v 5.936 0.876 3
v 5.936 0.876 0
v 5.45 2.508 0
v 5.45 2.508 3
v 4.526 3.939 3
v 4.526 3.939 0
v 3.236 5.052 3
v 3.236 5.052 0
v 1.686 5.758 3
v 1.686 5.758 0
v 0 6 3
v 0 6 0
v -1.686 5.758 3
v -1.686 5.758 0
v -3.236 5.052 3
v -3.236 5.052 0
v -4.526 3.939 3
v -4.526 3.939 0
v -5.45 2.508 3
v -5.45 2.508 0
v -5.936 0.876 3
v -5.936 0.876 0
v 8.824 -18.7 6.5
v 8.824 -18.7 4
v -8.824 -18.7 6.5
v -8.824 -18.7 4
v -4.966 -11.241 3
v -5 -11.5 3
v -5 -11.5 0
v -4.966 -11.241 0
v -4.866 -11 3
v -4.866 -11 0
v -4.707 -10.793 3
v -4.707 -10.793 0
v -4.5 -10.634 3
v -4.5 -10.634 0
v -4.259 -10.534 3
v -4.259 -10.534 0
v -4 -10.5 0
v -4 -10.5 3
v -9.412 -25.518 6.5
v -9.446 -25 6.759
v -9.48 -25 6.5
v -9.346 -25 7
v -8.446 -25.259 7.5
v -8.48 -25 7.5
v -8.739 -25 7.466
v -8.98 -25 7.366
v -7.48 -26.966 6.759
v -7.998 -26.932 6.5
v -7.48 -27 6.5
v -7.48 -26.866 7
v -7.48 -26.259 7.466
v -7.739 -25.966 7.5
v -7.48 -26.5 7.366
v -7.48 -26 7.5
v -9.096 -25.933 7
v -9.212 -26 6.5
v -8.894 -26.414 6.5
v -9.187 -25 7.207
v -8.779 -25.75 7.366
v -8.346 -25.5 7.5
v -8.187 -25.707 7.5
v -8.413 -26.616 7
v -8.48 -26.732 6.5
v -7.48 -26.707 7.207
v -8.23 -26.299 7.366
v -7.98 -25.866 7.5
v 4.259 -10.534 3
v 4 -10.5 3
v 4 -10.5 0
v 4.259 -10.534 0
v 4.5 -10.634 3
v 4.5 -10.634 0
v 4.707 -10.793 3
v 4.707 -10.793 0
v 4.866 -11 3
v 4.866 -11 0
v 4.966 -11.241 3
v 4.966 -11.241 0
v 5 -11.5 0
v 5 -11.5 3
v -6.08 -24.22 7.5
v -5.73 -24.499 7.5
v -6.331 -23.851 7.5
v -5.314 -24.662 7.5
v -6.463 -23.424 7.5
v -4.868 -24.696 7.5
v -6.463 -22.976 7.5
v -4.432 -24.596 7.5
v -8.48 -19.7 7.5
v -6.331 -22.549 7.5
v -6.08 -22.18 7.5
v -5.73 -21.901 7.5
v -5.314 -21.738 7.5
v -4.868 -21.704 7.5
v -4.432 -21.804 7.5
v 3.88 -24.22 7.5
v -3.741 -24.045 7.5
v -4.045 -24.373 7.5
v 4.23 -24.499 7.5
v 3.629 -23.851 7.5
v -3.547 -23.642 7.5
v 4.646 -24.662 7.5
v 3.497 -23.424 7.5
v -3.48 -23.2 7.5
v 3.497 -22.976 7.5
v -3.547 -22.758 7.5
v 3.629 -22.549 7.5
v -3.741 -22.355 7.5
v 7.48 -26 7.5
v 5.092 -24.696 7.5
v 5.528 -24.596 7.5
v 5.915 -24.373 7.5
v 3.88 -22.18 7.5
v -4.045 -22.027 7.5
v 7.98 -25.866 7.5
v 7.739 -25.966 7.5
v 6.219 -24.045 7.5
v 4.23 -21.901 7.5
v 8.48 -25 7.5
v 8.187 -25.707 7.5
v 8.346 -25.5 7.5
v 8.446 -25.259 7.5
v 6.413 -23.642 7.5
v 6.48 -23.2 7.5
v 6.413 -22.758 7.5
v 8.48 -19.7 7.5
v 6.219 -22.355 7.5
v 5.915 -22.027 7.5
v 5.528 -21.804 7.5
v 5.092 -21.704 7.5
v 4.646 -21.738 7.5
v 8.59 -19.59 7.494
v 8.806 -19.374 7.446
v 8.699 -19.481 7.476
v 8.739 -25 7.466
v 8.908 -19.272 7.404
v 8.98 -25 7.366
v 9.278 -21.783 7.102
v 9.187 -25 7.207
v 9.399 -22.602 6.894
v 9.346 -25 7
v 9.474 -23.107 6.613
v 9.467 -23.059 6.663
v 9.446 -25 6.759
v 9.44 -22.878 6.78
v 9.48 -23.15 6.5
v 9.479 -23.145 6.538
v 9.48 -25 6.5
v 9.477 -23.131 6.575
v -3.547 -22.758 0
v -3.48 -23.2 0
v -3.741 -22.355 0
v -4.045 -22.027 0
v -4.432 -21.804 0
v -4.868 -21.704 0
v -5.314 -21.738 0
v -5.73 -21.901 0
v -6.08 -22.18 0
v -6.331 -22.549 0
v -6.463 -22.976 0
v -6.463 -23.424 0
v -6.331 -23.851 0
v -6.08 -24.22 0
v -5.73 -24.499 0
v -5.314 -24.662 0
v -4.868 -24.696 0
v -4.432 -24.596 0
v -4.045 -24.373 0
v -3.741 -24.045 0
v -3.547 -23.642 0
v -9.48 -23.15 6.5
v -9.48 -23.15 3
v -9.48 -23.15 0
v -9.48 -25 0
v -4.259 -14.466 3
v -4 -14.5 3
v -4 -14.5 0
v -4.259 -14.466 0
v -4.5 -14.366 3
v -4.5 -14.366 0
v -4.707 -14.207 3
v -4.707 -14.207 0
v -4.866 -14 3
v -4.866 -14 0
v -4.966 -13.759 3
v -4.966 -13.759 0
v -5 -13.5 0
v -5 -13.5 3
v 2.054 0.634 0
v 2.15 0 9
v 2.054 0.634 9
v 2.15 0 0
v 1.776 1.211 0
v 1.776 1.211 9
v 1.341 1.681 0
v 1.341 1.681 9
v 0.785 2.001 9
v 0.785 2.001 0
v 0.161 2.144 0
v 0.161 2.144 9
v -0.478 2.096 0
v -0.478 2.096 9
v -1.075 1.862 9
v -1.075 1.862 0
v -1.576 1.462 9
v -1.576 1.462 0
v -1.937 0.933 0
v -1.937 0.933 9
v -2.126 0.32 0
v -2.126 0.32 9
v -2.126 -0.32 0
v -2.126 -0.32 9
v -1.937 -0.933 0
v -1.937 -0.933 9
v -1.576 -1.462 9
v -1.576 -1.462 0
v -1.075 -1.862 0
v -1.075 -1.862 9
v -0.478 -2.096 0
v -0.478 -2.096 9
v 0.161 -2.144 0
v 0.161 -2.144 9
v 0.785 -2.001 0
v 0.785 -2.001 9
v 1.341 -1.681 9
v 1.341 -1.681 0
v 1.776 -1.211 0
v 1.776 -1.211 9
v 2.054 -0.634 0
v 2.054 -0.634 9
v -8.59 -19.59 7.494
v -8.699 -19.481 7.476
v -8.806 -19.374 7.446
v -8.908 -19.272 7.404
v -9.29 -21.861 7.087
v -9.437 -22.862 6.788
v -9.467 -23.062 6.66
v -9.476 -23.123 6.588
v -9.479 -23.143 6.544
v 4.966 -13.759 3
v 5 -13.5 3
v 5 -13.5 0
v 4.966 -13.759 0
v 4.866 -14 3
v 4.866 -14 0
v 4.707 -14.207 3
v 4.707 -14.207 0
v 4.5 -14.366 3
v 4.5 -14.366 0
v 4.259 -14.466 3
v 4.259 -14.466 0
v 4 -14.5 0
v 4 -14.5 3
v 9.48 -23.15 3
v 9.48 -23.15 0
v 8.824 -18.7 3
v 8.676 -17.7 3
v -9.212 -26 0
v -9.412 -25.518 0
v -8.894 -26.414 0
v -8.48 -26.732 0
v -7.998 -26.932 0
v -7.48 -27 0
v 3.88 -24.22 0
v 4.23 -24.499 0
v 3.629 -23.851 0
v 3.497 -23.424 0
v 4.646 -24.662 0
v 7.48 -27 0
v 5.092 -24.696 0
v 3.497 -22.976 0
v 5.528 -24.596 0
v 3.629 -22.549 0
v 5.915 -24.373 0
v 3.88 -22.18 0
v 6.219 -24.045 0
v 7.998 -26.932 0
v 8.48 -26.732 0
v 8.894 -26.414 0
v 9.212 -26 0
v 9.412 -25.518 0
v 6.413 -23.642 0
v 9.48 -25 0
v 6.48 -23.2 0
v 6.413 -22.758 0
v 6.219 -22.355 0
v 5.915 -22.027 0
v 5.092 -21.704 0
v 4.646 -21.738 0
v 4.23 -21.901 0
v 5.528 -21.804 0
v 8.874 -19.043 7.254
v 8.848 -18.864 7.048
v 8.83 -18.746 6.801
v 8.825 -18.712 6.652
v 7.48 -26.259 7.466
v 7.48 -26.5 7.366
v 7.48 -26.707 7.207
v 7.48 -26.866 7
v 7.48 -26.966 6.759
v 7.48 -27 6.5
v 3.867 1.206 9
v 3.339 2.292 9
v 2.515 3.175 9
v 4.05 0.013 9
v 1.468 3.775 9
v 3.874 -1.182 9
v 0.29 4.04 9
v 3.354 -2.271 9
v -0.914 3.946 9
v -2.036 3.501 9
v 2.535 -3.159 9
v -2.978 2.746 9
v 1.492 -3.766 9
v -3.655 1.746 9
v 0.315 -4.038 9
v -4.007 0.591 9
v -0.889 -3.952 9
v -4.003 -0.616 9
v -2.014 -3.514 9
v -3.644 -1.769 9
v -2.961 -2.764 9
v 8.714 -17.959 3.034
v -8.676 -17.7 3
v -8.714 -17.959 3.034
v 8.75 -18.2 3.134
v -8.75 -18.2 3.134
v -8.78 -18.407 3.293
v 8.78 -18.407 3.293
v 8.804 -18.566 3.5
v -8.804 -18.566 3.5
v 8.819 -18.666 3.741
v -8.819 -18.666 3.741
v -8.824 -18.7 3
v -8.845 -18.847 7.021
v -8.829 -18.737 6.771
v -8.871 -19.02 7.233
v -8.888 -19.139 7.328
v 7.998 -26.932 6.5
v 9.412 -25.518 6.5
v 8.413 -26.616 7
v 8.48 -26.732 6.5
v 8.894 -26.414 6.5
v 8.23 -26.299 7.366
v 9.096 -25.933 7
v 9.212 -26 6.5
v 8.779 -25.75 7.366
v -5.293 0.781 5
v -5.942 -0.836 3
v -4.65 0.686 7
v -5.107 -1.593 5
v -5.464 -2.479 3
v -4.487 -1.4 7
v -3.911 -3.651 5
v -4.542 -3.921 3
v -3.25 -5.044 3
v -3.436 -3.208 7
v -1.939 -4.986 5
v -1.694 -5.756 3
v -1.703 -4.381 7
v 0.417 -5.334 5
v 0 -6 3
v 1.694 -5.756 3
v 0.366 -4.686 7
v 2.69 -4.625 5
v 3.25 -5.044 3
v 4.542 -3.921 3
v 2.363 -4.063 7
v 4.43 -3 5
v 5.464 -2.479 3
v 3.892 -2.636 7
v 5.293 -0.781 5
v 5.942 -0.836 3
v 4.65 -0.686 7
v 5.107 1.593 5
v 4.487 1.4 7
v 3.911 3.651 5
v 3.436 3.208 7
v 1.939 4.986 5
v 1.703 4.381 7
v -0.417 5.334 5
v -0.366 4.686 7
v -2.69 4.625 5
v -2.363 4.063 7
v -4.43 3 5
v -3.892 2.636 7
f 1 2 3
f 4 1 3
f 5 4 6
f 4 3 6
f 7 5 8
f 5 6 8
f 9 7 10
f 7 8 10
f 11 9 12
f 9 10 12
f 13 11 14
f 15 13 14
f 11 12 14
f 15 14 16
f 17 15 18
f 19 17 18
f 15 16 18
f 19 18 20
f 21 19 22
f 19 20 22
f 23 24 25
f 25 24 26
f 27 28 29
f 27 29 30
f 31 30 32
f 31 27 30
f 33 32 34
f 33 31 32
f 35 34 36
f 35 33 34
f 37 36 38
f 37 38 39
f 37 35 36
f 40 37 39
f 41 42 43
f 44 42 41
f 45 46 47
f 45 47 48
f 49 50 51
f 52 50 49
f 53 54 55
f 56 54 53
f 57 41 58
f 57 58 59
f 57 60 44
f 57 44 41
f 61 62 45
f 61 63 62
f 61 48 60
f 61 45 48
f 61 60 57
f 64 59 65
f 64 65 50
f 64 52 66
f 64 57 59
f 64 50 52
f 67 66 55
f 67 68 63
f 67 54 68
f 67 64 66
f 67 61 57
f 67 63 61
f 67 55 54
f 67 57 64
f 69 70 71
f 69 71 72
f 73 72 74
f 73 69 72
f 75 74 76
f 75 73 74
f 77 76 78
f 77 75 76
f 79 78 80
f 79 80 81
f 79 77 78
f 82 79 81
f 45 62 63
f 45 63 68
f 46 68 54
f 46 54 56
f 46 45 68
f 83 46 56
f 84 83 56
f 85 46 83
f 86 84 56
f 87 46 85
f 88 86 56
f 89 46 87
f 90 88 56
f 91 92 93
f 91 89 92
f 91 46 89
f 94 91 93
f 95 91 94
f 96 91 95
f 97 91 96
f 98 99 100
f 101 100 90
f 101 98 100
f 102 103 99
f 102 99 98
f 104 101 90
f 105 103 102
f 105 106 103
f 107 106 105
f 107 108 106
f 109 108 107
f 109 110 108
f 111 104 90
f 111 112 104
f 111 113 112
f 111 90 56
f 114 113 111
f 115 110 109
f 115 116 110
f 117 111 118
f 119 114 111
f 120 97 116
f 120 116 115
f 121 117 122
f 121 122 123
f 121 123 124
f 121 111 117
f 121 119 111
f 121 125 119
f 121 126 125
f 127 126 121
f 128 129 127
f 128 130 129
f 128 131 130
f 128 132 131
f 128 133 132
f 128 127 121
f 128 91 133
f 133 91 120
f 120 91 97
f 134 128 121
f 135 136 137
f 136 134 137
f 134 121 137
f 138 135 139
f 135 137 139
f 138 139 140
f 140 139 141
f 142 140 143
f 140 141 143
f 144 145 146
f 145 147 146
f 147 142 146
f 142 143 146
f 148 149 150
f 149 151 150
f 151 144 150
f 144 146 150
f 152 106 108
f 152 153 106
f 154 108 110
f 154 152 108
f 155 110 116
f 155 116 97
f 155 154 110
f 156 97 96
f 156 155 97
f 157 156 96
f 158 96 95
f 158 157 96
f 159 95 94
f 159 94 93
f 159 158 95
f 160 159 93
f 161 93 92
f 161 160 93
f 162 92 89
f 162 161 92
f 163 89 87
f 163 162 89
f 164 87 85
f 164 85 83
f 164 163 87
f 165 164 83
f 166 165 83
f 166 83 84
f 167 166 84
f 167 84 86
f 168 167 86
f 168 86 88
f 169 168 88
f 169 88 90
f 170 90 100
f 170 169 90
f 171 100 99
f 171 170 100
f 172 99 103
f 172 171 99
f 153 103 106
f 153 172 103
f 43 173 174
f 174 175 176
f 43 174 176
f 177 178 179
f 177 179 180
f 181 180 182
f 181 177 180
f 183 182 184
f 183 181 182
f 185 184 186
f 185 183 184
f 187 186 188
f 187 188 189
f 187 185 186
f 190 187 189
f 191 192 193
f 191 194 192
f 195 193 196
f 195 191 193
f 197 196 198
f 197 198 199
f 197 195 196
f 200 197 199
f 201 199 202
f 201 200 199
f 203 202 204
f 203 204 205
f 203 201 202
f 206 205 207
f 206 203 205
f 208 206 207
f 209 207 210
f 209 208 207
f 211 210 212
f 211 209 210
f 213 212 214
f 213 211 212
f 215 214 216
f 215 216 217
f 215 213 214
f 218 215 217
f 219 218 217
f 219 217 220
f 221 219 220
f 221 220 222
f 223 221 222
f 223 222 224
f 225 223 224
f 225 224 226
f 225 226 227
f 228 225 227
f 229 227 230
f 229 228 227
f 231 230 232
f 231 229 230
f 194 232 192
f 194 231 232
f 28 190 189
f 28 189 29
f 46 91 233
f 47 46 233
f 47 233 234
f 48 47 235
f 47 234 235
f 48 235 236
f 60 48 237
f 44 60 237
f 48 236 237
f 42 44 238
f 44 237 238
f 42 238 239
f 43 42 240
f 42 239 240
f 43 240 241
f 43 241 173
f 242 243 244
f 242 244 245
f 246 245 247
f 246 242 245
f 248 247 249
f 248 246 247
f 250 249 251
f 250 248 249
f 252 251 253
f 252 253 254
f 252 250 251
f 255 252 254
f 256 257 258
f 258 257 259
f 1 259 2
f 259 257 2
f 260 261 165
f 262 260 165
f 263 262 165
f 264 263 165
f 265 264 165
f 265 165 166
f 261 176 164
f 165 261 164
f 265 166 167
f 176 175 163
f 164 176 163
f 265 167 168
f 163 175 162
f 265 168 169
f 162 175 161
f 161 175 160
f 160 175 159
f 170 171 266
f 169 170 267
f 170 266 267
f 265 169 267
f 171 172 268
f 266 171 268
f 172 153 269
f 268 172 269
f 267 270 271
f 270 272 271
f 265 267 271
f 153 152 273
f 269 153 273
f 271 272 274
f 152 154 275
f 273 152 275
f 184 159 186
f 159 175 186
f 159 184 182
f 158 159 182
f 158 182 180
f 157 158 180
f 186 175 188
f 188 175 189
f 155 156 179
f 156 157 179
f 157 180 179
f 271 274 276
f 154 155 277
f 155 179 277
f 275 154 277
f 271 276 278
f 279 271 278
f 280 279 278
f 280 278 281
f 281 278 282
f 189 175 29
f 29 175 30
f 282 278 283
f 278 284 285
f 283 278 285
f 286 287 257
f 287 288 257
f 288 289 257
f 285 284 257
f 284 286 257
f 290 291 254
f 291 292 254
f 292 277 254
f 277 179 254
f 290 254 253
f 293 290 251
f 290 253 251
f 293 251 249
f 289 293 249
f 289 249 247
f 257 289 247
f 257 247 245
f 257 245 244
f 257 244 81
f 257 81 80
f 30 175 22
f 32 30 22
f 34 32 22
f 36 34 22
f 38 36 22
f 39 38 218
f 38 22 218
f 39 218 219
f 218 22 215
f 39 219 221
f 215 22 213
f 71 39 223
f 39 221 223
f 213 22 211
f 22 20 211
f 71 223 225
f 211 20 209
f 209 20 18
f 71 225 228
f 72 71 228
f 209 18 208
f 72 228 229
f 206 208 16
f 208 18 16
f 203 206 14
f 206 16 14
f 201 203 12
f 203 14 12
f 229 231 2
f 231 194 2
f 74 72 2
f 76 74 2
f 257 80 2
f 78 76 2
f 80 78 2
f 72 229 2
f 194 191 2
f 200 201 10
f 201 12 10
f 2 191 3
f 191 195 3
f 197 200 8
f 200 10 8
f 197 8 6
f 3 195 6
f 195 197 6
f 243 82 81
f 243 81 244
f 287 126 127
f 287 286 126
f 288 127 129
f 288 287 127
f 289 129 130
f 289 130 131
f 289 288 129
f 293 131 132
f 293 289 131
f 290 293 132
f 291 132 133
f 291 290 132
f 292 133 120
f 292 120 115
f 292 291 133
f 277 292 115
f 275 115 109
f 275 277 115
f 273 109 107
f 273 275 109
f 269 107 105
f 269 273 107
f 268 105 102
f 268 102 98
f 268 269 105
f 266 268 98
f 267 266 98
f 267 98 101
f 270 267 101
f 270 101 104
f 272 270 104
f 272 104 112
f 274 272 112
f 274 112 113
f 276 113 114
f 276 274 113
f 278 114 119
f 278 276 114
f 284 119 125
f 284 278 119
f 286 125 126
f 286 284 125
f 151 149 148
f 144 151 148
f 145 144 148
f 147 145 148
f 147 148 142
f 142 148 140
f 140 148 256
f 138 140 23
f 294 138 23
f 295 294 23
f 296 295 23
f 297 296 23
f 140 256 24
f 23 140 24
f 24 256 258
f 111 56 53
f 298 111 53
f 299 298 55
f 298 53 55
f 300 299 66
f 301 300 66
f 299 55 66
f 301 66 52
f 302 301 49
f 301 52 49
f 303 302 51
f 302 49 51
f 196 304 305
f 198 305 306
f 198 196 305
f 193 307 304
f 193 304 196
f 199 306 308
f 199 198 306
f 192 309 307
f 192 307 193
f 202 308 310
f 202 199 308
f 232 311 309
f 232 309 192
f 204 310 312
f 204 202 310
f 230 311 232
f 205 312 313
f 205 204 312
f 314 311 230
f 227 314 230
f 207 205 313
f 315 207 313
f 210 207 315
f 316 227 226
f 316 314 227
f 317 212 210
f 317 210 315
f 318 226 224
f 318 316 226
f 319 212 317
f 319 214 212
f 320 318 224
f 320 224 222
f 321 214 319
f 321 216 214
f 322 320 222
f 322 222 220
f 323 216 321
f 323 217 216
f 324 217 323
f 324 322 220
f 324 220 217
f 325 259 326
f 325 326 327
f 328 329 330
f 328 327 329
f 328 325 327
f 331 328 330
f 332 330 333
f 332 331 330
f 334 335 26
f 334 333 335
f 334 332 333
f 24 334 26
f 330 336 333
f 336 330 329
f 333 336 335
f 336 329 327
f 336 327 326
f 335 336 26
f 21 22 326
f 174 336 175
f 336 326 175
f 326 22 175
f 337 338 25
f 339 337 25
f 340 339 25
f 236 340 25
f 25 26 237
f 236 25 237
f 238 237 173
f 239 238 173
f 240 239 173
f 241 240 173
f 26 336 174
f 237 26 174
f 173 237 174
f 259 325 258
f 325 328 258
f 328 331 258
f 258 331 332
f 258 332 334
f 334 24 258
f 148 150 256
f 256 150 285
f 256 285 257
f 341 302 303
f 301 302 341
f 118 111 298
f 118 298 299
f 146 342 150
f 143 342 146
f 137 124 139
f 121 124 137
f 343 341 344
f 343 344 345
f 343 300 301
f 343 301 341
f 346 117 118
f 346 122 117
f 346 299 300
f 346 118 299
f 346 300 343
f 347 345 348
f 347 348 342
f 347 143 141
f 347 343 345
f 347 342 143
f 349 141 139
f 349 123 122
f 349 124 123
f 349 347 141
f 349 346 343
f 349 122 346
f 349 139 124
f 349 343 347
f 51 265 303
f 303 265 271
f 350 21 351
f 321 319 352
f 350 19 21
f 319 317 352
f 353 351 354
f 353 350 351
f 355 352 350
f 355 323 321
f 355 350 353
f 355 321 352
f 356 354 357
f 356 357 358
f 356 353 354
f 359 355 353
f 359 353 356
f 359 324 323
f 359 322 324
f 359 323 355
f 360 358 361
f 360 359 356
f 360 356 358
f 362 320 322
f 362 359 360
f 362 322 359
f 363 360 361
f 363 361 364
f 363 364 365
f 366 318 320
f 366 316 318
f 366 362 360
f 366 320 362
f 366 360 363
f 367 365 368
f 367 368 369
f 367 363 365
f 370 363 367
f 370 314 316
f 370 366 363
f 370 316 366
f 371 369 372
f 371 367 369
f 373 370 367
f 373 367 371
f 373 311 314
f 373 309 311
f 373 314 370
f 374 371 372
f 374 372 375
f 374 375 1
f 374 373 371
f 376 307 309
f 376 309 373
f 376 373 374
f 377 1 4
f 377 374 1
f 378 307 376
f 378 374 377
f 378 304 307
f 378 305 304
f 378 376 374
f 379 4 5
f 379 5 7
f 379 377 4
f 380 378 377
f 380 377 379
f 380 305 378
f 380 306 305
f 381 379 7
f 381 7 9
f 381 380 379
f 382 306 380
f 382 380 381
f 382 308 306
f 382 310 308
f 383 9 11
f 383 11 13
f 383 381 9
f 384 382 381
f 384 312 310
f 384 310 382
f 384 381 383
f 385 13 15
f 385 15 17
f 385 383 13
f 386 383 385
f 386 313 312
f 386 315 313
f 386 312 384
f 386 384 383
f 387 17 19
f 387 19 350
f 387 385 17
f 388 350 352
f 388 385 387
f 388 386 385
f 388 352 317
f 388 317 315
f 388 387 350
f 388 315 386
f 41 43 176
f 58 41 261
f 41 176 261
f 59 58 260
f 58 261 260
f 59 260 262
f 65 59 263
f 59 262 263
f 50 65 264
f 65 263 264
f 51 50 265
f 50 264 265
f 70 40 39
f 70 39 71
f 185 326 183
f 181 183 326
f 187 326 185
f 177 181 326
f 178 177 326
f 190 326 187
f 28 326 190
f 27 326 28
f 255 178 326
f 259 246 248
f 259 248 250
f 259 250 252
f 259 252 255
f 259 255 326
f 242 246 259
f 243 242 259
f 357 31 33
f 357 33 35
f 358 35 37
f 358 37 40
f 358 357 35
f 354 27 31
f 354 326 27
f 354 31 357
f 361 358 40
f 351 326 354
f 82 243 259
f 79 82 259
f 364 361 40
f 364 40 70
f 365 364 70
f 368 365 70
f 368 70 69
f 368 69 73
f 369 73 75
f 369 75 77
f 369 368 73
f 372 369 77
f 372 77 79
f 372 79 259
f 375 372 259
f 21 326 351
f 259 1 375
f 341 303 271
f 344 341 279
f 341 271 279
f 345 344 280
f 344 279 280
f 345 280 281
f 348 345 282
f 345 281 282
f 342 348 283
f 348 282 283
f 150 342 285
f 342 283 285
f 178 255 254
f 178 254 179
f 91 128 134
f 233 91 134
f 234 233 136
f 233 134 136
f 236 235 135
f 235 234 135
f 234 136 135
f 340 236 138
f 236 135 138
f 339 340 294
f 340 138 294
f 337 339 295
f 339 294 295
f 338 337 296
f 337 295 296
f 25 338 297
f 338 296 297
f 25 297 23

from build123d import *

# Parameters (mm, degrees)
SKETCH1_R       = 2.15
SKETCH1_R_2     = 1.5
EXTRUDE1_DEPTH  = 3
SKETCH2_R       = 6
SKETCH2_R_2     = 2.15
EXTRUDE2_DEPTH  = 6
EXTRUDE3_DEPTH  = 3
SKETCH4_R       = 1.5
EXTRUDE4_DEPTH  = 4.5
FILLET5_R       = 1
CHAMFER1_SIZE   = 6
CHAMFER1_SIZE_2 = 1.949518177


with BuildPart() as part:
    # Sketch1 → Extrude1 (new body)
    with BuildSketch(Plane.XY):
        with BuildLine():
            Line((-7.48, -27), (7.48, -27))
            ThreePointArc((7.48, -27), (8.894213562, -26.414213562), (9.48, -25))
            Line((9.48, -25), (9.48, -23.15))
            Line((9.48, -23.15), (5.935760988, 0.875637761))
            ThreePointArc((5.935760988, 0.875637761), (0, 6), (-5.935760988, 0.875637761))
            Line((-5.935760988, 0.875637761), (-9.48, -23.15))
            Line((-9.48, -23.15), (-9.48, -25))
            ThreePointArc((-9.48, -25), (-8.894213562, -26.414213562), (-7.48, -27))
        make_face()
        Circle(SKETCH1_R, mode=Mode.SUBTRACT)
        with Locations((-4.98, -23.2)):
            Circle(SKETCH1_R_2, mode=Mode.SUBTRACT)
        with Locations((4.98, -23.2)):
            Circle(SKETCH1_R_2, mode=Mode.SUBTRACT)
    extrude(amount=EXTRUDE1_DEPTH)

    # Sketch2 → Extrude2 (add)
    with BuildSketch(Plane.XY.offset(3)):
        with Locations(Location((0, 0, 0), (0, 0, 171.608305322))):
            Circle(SKETCH2_R)
        Circle(SKETCH2_R_2, mode=Mode.SUBTRACT)
    extrude(amount=EXTRUDE2_DEPTH)

    # Sketch3 → Extrude3 (cut)
    with BuildSketch(Plane.XY.offset(3)):
        with BuildLine():
            Line((-4, -10.5), (4, -10.5))
            ThreePointArc((4, -10.5), (4.707106781, -10.792893219), (5, -11.5))
            Line((5, -11.5), (5, -13.5))
            ThreePointArc((5, -13.5), (4.707106781, -14.207106781), (4, -14.5))
            Line((4, -14.5), (-4, -14.5))
            ThreePointArc((-4, -14.5), (-4.707106781, -14.207106781), (-5, -13.5))
            Line((-5, -13.5), (-5, -11.5))
            ThreePointArc((-5, -11.5), (-4.707106781, -10.792893219), (-4, -10.5))
        make_face()
    extrude(amount=-EXTRUDE3_DEPTH, mode=Mode.SUBTRACT)

    # Sketch4 → Extrude4 (add)
    with BuildSketch(Plane.XY.offset(3)):
        with BuildLine():
            Line((-7.48, -27), (7.48, -27))
            ThreePointArc((7.48, -27), (8.894213562, -26.414213562), (9.48, -25))
            Line((9.48, -25), (9.48, -23.15))
            Line((9.48, -23.15), (8.823540273, -18.7))
            Line((8.823540273, -18.7), (-8.823540273, -18.7))
            Line((-8.823540273, -18.7), (-9.48, -23.15))
            Line((-9.48, -23.15), (-9.48, -25))
            ThreePointArc((-9.48, -25), (-8.894213562, -26.414213562), (-7.48, -27))
        make_face()
        with Locations((-4.98, -23.2)):
            Circle(SKETCH4_R, mode=Mode.SUBTRACT)
        with Locations((4.98, -23.2)):
            Circle(SKETCH4_R, mode=Mode.SUBTRACT)
    extrude(amount=EXTRUDE4_DEPTH)

    # Fillet5
    # the kernel refuses this fillet: 1 mm, written as the material it adds along each edge
    with BuildSketch(Plane(origin=(14.823540273, -18.7, 3), x_dir=(0, 0, 1), z_dir=(-1, 0, 0))) as fillet5_piece_1_section:
        with BuildLine():
            CenterArc((FILLET5_R, FILLET5_R), FILLET5_R, 180, 90)
            Line((0, FILLET5_R), (-FILLET5_R * 0.02, FILLET5_R))
            Line((-FILLET5_R * 0.02, FILLET5_R), (-FILLET5_R * 0.02, -FILLET5_R * 0.02))
            Line((-FILLET5_R * 0.02, -FILLET5_R * 0.02), (FILLET5_R, -FILLET5_R * 0.02))
            Line((FILLET5_R, -FILLET5_R * 0.02), (FILLET5_R, 0))
        make_face()
    fillet5_piece_1 = extrude(amount=29.647080546, mode=Mode.PRIVATE)
    fillet5_piece_1 = split(fillet5_piece_1, bisect_by=Plane(origin=(-8.603039543, -17.20527274, 3.226855902), z_dir=(0.9892934980650984, -0.1459396268534398, 0)), keep=Keep.TOP, mode=Mode.PRIVATE)
    fillet5_piece_1 = split(fillet5_piece_1, bisect_by=Plane(origin=(8.603039543, -17.20527274, 3.226855902), z_dir=(-0.9892934980650984, -0.14593962685343984, 0)), keep=Keep.TOP, mode=Mode.PRIVATE)
    add(fillet5_piece_1)
    # the kernel refuses this fillet: 1 mm, written as the material it takes off along each edge
    with BuildSketch(Plane(origin=(-9.48, -17.15, 7.5), x_dir=(0, 0, -1), z_dir=(0, -1, 0))) as fillet5_2_piece_1:
        with BuildLine():
            CenterArc((FILLET5_R, FILLET5_R), FILLET5_R, 180, 90)
            Line((0, FILLET5_R), (-FILLET5_R * 0.02, FILLET5_R))
            Line((-FILLET5_R * 0.02, FILLET5_R), (-FILLET5_R * 0.02, -FILLET5_R * 0.02))
            Line((-FILLET5_R * 0.02, -FILLET5_R * 0.02), (FILLET5_R, -FILLET5_R * 0.02))
            Line((FILLET5_R, -FILLET5_R * 0.02), (FILLET5_R, 0))
        make_face()
    extrude(amount=7.85, mode=Mode.SUBTRACT)
    with BuildSketch(Plane(origin=(9.48, -25, 7.5), x_dir=(-1, 0, 0), z_dir=(0, 1, 0))) as fillet5_2_piece_2:
        with BuildLine():
            CenterArc((FILLET5_R, -FILLET5_R), FILLET5_R, 90, 90)
            Line((0, -FILLET5_R), (-FILLET5_R * 0.02, -FILLET5_R))
            Line((-FILLET5_R * 0.02, -FILLET5_R), (-FILLET5_R * 0.02, FILLET5_R * 0.02))
            Line((-FILLET5_R * 0.02, FILLET5_R * 0.02), (FILLET5_R, FILLET5_R * 0.02))
            Line((FILLET5_R, FILLET5_R * 0.02), (FILLET5_R, 0))
        make_face()
    extrude(amount=7.85, mode=Mode.SUBTRACT)
    with BuildSketch(Plane(origin=(-7.48, -27, 7.5), x_dir=(0, 1, 0), z_dir=(1, 0, 0))) as fillet5_2_piece_3:
        with BuildLine():
            CenterArc((FILLET5_R, -FILLET5_R), FILLET5_R, 90, 90)
            Line((0, -FILLET5_R), (-FILLET5_R * 0.02, -FILLET5_R))
            Line((-FILLET5_R * 0.02, -FILLET5_R), (-FILLET5_R * 0.02, FILLET5_R * 0.02))
            Line((-FILLET5_R * 0.02, FILLET5_R * 0.02), (FILLET5_R, FILLET5_R * 0.02))
            Line((FILLET5_R, FILLET5_R * 0.02), (FILLET5_R, 0))
        make_face()
    extrude(amount=14.96, mode=Mode.SUBTRACT)
    with BuildSketch(Plane(origin=(14.823540273, -18.7, 7.5), x_dir=(0, -1, 0), z_dir=(-1, 0, 0))) as fillet5_2_piece_4:
        with BuildLine():
            CenterArc((FILLET5_R, -FILLET5_R), FILLET5_R, 90, 90)
            Line((0, -FILLET5_R), (-FILLET5_R * 0.02, -FILLET5_R))
            Line((-FILLET5_R * 0.02, -FILLET5_R), (-FILLET5_R * 0.02, FILLET5_R * 0.02))
            Line((-FILLET5_R * 0.02, FILLET5_R * 0.02), (FILLET5_R, FILLET5_R * 0.02))
            Line((FILLET5_R, FILLET5_R * 0.02), (FILLET5_R, 0))
        make_face()
    extrude(amount=29.647080546, mode=Mode.SUBTRACT)
    with BuildSketch(Plane(origin=(-7.48, -25, 7.5), x_dir=(-1, 0, 0), z_dir=(0, 1, 0))) as fillet5_2_piece_5:
        with BuildLine():
            CenterArc((2 - FILLET5_R, -FILLET5_R), FILLET5_R, 0, 90)
            Line((2, -FILLET5_R), (2 + FILLET5_R * 0.02, -FILLET5_R))
            Line((2 + FILLET5_R * 0.02, -FILLET5_R), (2 + FILLET5_R * 0.02, FILLET5_R * 0.02))
            Line((2 + FILLET5_R * 0.02, FILLET5_R * 0.02), (2 - FILLET5_R, FILLET5_R * 0.02))
            Line((2 - FILLET5_R, FILLET5_R * 0.02), (2 - FILLET5_R, 0))
        make_face()
    revolve(axis=Axis((-7.48, -25, 7.5), (0, 0, 1)), revolution_arc=90, mode=Mode.SUBTRACT)
    with BuildSketch(Plane(origin=(7.48, -25, 7.5), x_dir=(0, -1, 0), z_dir=(-1, 0, 0))) as fillet5_2_piece_6:
        with BuildLine():
            CenterArc((2 - FILLET5_R, -FILLET5_R), FILLET5_R, 0, 90)
            Line((2, -FILLET5_R), (2 + FILLET5_R * 0.02, -FILLET5_R))
            Line((2 + FILLET5_R * 0.02, -FILLET5_R), (2 + FILLET5_R * 0.02, FILLET5_R * 0.02))
            Line((2 + FILLET5_R * 0.02, FILLET5_R * 0.02), (2 - FILLET5_R, FILLET5_R * 0.02))
            Line((2 - FILLET5_R, FILLET5_R * 0.02), (2 - FILLET5_R, 0))
        make_face()
    revolve(axis=Axis((7.48, -25, 7.5), (0, 0, 1)), revolution_arc=90, mode=Mode.SUBTRACT)

    # Chamfer1
    # the kernel refuses this chamfer: 6, 1.949518177 mm, written as the material it takes off along each edge
    with BuildSketch(Plane(origin=(0, 0, 9), x_dir=(-0.9892934980663286, 0.14593962684510065, 0), z_dir=(0.14593962684510065, 0.9892934980663286, 0))) as chamfer1_piece_1_section:
        Polygon((6, -CHAMFER1_SIZE), (6 - CHAMFER1_SIZE_2, 0), (6, 0), align=None)
    chamfer1_piece_1 = revolve(axis=Axis((0, 0, 9), (0, 0, 1)), mode=Mode.PRIVATE)
    chamfer1_piece_1 = split(chamfer1_piece_1, bisect_by=Plane(origin=(4.992893688, -0.736546882, 3), z_dir=(0, 0, 1)), keep=Keep.TOP, mode=Mode.PRIVATE)
    add(chamfer1_piece_1, mode=Mode.SUBTRACT)


solid = part.part
